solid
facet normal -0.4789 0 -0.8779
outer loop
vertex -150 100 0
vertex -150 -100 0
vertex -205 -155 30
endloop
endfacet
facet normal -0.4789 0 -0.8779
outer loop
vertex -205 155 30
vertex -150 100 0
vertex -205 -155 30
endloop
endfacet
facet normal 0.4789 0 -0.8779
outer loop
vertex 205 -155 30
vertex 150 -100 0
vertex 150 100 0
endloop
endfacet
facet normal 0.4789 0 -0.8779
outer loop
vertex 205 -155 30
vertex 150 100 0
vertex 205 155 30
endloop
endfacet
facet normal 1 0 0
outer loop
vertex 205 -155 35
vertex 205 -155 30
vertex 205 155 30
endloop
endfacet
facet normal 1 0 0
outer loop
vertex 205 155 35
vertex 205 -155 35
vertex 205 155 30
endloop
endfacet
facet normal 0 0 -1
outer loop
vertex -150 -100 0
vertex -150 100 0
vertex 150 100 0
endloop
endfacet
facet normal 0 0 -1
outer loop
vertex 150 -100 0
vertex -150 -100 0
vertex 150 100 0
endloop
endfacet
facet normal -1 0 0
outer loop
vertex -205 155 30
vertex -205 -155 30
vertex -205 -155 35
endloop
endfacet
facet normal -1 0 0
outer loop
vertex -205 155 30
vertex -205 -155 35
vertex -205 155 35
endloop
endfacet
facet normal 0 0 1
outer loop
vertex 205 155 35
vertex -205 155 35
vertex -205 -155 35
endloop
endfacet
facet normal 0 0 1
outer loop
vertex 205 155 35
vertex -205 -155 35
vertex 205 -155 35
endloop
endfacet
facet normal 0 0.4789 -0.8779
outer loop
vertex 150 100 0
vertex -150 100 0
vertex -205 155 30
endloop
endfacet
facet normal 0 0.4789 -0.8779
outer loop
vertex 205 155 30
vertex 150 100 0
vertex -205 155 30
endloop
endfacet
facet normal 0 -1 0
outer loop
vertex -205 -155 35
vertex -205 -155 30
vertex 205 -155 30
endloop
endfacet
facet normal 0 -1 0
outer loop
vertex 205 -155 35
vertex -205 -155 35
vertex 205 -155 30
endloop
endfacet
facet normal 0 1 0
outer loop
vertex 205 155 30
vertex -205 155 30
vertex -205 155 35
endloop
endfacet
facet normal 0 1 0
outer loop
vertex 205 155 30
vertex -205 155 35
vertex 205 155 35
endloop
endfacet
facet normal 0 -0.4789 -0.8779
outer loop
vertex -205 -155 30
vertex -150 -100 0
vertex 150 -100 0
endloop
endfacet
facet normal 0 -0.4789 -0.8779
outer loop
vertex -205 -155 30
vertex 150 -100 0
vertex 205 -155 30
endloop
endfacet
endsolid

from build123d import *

# Parameters (mm, degrees)
F0_W     = 410
F0_H     = 310
F1_DEPTH = 35
F3_DEPTH = 413
F7_DEPTH = 455


with BuildPart() as f1:
    # F0 (on Top) → F1 (new body)
    with BuildSketch(Plane.XY):
        Rectangle(F0_W, F0_H)
    extrude(amount=F1_DEPTH)


with BuildPart() as f3:
    # F2 (on face) → F3 (new body)
    with BuildSketch(Plane.XZ.offset(155)):
        Polygon((-186.286226, -45.123053), (-150, 0), (-205, 30), (-247.468904, 11.412853), align=None)
    extrude(amount=-F3_DEPTH)


with BuildPart() as f4_1:
    # F4: instance of F3
    add(f3.part.mirror(Plane.YZ))


with BuildPart() as f1_1:
    add(f1.part)

    # F5: cut F3, F4_1
    add(f3.part, mode=Mode.SUBTRACT)
    add(f4_1.part, mode=Mode.SUBTRACT)


with BuildPart() as f7:
    # F6 (on face) → F7 (new body)
    with BuildSketch(Plane(origin=(-205, 0, 0), x_dir=(0, -1, 0), z_dir=(-1, 0, 0))):
        Polygon((-155, -27.468236), (-100, 0), (-155, 30), (-189.205855, 15.520646), align=None)
    extrude(amount=-F7_DEPTH)


with BuildPart() as f8_1:
    # F8: instance of F7
    add(f7.part.mirror(Plane.XZ))


with BuildPart() as f1_2:
    add(f1_1.part)

    # F9: cut F7, F8_1
    add(f7.part, mode=Mode.SUBTRACT)
    add(f8_1.part, mode=Mode.SUBTRACT)


solid = f1_2.part
